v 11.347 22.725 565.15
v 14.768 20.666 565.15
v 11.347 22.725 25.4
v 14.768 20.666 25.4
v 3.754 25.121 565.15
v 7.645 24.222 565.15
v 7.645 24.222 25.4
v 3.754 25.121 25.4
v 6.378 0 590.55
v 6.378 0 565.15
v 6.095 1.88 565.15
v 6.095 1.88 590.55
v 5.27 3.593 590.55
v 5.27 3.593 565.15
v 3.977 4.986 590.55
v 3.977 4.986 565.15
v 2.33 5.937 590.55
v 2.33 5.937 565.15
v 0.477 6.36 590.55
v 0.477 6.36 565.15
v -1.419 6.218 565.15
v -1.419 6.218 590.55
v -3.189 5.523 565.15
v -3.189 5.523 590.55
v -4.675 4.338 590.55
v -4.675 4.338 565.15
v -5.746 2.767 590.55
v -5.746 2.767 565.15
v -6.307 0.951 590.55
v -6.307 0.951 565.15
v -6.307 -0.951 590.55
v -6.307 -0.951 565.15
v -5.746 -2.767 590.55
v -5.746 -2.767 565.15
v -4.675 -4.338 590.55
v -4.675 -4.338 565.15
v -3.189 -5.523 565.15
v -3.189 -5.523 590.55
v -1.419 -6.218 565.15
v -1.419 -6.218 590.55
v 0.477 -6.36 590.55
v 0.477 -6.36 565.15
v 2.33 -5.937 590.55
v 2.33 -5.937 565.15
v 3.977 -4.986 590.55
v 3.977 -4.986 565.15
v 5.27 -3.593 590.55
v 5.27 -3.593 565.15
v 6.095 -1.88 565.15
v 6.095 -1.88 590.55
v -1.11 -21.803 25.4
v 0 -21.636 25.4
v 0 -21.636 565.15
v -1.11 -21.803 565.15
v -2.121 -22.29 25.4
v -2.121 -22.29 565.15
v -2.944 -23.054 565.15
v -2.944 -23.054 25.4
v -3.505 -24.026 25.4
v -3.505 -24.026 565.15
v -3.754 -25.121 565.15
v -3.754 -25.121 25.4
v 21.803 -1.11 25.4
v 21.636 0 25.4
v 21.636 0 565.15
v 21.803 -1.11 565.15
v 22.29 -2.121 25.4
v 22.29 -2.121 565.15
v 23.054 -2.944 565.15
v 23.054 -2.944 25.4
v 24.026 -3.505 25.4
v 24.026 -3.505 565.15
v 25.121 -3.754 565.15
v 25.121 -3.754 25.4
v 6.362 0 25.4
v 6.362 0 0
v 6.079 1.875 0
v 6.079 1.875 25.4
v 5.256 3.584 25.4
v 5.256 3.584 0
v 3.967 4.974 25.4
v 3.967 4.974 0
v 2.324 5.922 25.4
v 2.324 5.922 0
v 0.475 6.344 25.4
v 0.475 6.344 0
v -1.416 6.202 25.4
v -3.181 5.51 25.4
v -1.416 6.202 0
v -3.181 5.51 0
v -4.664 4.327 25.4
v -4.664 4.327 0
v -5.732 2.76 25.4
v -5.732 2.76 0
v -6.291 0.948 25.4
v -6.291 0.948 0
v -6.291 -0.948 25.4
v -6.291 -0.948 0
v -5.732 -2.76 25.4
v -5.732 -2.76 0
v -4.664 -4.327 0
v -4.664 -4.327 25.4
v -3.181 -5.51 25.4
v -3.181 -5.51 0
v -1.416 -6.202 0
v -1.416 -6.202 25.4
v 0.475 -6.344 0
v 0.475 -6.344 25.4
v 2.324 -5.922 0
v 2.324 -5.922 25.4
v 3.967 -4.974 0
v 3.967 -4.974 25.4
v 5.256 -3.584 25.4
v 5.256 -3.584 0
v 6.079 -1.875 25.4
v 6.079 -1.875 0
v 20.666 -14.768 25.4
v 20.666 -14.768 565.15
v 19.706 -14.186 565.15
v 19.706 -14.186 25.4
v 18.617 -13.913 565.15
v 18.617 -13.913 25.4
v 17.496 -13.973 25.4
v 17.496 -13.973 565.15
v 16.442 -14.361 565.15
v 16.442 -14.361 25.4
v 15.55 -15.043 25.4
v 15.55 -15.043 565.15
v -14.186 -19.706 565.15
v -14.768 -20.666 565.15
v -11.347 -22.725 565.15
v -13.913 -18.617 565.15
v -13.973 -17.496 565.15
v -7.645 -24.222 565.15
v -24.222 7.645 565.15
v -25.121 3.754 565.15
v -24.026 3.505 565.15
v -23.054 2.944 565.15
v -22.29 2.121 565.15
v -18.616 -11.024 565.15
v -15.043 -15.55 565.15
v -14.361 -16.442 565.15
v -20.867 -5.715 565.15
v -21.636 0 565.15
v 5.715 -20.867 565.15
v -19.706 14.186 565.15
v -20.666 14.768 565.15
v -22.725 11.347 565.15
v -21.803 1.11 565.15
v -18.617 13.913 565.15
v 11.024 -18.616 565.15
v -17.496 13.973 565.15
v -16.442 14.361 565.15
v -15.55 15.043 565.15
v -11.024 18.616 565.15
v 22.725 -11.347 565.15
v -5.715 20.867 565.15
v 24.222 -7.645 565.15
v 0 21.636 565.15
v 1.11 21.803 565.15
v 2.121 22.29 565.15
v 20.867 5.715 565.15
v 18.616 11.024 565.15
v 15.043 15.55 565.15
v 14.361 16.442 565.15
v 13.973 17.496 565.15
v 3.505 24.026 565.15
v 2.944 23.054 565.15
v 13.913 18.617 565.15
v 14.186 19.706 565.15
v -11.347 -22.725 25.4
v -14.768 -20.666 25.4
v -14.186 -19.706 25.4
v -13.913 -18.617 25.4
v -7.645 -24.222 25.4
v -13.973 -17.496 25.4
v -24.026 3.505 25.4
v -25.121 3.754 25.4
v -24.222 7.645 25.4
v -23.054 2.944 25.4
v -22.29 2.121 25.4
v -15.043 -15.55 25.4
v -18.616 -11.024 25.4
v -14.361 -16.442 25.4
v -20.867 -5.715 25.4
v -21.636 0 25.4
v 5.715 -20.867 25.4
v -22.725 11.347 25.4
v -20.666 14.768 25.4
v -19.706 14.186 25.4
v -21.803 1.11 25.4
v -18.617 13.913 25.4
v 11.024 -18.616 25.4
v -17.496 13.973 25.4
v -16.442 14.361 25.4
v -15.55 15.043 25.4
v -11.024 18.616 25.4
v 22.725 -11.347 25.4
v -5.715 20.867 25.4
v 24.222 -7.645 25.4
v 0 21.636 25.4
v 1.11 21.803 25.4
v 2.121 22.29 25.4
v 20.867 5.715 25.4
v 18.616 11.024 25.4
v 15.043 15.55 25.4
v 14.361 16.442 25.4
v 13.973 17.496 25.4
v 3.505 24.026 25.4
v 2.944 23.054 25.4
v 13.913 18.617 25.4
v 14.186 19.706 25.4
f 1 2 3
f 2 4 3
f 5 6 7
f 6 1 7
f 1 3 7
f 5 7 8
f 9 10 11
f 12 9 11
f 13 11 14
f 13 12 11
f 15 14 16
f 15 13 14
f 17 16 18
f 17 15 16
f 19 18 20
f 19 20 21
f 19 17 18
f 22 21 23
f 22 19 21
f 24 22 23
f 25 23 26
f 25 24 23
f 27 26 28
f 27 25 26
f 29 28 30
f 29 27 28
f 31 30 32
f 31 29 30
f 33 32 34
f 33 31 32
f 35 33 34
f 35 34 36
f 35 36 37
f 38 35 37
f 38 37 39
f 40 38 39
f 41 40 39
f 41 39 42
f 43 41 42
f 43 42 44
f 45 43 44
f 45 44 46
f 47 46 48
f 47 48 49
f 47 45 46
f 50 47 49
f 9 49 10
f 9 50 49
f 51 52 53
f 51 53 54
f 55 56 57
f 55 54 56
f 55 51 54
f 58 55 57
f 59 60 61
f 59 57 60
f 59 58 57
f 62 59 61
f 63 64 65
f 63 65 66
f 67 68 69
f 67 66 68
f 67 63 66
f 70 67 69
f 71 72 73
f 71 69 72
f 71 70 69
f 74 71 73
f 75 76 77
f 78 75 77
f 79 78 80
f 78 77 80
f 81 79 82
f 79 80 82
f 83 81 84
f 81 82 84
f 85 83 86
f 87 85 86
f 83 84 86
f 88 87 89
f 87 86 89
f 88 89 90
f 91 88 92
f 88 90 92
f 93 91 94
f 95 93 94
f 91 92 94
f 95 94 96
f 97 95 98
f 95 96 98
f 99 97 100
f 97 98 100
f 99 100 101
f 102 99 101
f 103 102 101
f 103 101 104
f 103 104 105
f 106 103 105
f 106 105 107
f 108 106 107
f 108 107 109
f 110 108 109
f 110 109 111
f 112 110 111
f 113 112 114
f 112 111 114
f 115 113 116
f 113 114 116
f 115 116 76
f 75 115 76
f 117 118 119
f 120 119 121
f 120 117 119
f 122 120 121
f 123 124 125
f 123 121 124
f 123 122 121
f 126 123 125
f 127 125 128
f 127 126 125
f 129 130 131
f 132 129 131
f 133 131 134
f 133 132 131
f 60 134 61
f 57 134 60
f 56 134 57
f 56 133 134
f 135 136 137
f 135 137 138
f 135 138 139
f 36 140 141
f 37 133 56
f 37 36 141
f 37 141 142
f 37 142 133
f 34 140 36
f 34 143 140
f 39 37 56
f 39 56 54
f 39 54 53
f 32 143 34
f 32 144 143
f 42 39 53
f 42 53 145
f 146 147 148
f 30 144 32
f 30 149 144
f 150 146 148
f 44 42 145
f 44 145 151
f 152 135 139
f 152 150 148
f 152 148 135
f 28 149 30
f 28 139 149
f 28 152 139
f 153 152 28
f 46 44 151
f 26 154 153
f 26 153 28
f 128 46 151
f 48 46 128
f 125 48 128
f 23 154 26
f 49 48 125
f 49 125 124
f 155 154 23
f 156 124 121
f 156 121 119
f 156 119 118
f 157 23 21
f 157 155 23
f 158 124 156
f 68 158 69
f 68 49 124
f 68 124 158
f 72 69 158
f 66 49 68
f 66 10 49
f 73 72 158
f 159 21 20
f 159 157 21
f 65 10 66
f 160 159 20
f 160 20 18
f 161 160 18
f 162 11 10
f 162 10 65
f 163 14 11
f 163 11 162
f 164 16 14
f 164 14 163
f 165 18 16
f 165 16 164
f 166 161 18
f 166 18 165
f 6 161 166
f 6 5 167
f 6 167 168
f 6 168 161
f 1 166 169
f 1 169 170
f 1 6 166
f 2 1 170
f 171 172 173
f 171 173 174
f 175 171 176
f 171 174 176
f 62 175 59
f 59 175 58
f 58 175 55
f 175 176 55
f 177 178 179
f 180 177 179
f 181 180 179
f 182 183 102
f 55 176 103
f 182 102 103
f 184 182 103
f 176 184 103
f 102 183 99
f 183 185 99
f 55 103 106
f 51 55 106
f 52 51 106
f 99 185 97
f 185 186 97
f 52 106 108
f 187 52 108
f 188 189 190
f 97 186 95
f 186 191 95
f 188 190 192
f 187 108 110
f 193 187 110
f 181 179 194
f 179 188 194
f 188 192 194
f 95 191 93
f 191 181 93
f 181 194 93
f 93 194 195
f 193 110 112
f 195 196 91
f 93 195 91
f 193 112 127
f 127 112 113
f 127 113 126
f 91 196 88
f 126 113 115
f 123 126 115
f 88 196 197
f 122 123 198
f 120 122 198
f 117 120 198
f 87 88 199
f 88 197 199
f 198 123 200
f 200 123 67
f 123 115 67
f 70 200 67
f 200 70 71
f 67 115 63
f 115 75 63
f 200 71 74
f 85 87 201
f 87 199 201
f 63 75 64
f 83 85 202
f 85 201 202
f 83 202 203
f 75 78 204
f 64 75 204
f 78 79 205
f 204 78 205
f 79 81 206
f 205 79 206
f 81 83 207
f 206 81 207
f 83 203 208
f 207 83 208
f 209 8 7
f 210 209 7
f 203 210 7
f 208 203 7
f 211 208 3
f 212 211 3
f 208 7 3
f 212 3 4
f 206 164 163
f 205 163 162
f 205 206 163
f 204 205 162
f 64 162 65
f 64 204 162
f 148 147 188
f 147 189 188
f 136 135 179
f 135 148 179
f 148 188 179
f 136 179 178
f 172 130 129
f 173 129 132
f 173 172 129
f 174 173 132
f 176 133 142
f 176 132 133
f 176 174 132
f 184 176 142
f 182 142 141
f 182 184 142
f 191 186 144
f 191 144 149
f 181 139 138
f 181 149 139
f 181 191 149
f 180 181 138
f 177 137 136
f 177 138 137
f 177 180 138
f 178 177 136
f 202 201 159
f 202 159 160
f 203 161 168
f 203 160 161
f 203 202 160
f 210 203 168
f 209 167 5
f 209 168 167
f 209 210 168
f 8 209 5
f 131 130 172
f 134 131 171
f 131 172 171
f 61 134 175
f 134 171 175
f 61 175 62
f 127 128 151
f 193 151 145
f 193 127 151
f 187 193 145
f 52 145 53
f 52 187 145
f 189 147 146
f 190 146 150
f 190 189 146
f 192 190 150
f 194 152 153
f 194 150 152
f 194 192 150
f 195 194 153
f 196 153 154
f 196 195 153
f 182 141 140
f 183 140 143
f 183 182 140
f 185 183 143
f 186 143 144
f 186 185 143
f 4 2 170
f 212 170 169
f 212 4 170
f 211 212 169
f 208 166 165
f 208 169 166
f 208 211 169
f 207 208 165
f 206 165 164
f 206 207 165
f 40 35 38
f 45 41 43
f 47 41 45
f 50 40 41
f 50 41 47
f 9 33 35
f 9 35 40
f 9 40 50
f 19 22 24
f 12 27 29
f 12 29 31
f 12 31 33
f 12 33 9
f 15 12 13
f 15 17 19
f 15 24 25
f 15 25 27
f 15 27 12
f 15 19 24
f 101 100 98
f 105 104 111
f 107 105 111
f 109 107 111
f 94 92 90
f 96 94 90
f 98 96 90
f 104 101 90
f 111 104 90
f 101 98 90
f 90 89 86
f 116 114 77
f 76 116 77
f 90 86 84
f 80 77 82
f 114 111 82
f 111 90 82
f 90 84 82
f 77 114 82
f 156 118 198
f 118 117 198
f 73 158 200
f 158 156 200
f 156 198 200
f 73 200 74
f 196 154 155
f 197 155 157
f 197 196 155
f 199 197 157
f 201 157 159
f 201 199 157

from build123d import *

# Parameters (mm, degrees)
SKETCH1_R           = 25.4
BOSS_EXTRUDE1_DEPTH = 590.55
SKETCH2_OUTSIDE_W   = 171.78
SKETCH2_OUTSIDE_H   = 171.78
SKETCH2_OUTSIDE_R   = 6.361935525
CUT_EXTRUDE1_DEPTH  = 25.4
SKETCH5_OUTSIDE_W   = 171.78
SKETCH5_OUTSIDE_H   = 171.78
SKETCH5_OUTSIDE_R   = 6.377907631
CUT_EXTRUDE4_DEPTH  = 25.4
CUT_EXTRUDE5_DEPTH  = 568.96
CIRPATTERN1_COUNT   = 4


with BuildPart() as part:
    # Sketch1 → Boss-Extrude1 (new body)
    with BuildSketch(Plane.XY):
        Circle(SKETCH1_R)
    extrude(amount=BOSS_EXTRUDE1_DEPTH)

    # Sketch2 outside → Cut-Extrude1 (cut)
    with BuildSketch(Plane.XY):
        Rectangle(SKETCH2_OUTSIDE_W, SKETCH2_OUTSIDE_H)
        Circle(SKETCH2_OUTSIDE_R, mode=Mode.SUBTRACT)
    extrude(amount=CUT_EXTRUDE1_DEPTH, mode=Mode.SUBTRACT)

    # Sketch5 outside → Cut-Extrude4 (cut)
    with BuildSketch(Plane.XY.offset(590.55)):
        Rectangle(SKETCH5_OUTSIDE_W, SKETCH5_OUTSIDE_H)
        Circle(SKETCH5_OUTSIDE_R, mode=Mode.SUBTRACT)
    extrude(amount=-CUT_EXTRUDE4_DEPTH, mode=Mode.SUBTRACT)

    # Sketch6 → Cut-Extrude5 (cut)
    with BuildSketch(Plane.XY):
        with BuildLine():
            ThreePointArc((29.164386469, 0), (26.85091062, 11.383761989), (20.277517743, 20.961481635))
            ThreePointArc((20.277517743, 20.961481635), (14.954603392, 20.873199153), (15.042885874, 15.550284802))
            ThreePointArc((15.042885874, 15.550284802), (19.919360406, 8.445049073), (21.635613531, 0))
            ThreePointArc((21.635613531, 0), (25.4, -3.764386469), (29.164386469, 0))
        make_face()
    cut_extrude5 = extrude(amount=CUT_EXTRUDE5_DEPTH, mode=Mode.SUBTRACT)

    # CirPattern1: Cut-Extrude5 ×4 about axis
    cirpattern1_axis = Axis((0, 0, 0), (0, 0, 1))
    for i in range(1, CIRPATTERN1_COUNT):
        add(cut_extrude5.rotate(cirpattern1_axis, i * 360 / CIRPATTERN1_COUNT), mode=Mode.SUBTRACT)


solid = part.part
